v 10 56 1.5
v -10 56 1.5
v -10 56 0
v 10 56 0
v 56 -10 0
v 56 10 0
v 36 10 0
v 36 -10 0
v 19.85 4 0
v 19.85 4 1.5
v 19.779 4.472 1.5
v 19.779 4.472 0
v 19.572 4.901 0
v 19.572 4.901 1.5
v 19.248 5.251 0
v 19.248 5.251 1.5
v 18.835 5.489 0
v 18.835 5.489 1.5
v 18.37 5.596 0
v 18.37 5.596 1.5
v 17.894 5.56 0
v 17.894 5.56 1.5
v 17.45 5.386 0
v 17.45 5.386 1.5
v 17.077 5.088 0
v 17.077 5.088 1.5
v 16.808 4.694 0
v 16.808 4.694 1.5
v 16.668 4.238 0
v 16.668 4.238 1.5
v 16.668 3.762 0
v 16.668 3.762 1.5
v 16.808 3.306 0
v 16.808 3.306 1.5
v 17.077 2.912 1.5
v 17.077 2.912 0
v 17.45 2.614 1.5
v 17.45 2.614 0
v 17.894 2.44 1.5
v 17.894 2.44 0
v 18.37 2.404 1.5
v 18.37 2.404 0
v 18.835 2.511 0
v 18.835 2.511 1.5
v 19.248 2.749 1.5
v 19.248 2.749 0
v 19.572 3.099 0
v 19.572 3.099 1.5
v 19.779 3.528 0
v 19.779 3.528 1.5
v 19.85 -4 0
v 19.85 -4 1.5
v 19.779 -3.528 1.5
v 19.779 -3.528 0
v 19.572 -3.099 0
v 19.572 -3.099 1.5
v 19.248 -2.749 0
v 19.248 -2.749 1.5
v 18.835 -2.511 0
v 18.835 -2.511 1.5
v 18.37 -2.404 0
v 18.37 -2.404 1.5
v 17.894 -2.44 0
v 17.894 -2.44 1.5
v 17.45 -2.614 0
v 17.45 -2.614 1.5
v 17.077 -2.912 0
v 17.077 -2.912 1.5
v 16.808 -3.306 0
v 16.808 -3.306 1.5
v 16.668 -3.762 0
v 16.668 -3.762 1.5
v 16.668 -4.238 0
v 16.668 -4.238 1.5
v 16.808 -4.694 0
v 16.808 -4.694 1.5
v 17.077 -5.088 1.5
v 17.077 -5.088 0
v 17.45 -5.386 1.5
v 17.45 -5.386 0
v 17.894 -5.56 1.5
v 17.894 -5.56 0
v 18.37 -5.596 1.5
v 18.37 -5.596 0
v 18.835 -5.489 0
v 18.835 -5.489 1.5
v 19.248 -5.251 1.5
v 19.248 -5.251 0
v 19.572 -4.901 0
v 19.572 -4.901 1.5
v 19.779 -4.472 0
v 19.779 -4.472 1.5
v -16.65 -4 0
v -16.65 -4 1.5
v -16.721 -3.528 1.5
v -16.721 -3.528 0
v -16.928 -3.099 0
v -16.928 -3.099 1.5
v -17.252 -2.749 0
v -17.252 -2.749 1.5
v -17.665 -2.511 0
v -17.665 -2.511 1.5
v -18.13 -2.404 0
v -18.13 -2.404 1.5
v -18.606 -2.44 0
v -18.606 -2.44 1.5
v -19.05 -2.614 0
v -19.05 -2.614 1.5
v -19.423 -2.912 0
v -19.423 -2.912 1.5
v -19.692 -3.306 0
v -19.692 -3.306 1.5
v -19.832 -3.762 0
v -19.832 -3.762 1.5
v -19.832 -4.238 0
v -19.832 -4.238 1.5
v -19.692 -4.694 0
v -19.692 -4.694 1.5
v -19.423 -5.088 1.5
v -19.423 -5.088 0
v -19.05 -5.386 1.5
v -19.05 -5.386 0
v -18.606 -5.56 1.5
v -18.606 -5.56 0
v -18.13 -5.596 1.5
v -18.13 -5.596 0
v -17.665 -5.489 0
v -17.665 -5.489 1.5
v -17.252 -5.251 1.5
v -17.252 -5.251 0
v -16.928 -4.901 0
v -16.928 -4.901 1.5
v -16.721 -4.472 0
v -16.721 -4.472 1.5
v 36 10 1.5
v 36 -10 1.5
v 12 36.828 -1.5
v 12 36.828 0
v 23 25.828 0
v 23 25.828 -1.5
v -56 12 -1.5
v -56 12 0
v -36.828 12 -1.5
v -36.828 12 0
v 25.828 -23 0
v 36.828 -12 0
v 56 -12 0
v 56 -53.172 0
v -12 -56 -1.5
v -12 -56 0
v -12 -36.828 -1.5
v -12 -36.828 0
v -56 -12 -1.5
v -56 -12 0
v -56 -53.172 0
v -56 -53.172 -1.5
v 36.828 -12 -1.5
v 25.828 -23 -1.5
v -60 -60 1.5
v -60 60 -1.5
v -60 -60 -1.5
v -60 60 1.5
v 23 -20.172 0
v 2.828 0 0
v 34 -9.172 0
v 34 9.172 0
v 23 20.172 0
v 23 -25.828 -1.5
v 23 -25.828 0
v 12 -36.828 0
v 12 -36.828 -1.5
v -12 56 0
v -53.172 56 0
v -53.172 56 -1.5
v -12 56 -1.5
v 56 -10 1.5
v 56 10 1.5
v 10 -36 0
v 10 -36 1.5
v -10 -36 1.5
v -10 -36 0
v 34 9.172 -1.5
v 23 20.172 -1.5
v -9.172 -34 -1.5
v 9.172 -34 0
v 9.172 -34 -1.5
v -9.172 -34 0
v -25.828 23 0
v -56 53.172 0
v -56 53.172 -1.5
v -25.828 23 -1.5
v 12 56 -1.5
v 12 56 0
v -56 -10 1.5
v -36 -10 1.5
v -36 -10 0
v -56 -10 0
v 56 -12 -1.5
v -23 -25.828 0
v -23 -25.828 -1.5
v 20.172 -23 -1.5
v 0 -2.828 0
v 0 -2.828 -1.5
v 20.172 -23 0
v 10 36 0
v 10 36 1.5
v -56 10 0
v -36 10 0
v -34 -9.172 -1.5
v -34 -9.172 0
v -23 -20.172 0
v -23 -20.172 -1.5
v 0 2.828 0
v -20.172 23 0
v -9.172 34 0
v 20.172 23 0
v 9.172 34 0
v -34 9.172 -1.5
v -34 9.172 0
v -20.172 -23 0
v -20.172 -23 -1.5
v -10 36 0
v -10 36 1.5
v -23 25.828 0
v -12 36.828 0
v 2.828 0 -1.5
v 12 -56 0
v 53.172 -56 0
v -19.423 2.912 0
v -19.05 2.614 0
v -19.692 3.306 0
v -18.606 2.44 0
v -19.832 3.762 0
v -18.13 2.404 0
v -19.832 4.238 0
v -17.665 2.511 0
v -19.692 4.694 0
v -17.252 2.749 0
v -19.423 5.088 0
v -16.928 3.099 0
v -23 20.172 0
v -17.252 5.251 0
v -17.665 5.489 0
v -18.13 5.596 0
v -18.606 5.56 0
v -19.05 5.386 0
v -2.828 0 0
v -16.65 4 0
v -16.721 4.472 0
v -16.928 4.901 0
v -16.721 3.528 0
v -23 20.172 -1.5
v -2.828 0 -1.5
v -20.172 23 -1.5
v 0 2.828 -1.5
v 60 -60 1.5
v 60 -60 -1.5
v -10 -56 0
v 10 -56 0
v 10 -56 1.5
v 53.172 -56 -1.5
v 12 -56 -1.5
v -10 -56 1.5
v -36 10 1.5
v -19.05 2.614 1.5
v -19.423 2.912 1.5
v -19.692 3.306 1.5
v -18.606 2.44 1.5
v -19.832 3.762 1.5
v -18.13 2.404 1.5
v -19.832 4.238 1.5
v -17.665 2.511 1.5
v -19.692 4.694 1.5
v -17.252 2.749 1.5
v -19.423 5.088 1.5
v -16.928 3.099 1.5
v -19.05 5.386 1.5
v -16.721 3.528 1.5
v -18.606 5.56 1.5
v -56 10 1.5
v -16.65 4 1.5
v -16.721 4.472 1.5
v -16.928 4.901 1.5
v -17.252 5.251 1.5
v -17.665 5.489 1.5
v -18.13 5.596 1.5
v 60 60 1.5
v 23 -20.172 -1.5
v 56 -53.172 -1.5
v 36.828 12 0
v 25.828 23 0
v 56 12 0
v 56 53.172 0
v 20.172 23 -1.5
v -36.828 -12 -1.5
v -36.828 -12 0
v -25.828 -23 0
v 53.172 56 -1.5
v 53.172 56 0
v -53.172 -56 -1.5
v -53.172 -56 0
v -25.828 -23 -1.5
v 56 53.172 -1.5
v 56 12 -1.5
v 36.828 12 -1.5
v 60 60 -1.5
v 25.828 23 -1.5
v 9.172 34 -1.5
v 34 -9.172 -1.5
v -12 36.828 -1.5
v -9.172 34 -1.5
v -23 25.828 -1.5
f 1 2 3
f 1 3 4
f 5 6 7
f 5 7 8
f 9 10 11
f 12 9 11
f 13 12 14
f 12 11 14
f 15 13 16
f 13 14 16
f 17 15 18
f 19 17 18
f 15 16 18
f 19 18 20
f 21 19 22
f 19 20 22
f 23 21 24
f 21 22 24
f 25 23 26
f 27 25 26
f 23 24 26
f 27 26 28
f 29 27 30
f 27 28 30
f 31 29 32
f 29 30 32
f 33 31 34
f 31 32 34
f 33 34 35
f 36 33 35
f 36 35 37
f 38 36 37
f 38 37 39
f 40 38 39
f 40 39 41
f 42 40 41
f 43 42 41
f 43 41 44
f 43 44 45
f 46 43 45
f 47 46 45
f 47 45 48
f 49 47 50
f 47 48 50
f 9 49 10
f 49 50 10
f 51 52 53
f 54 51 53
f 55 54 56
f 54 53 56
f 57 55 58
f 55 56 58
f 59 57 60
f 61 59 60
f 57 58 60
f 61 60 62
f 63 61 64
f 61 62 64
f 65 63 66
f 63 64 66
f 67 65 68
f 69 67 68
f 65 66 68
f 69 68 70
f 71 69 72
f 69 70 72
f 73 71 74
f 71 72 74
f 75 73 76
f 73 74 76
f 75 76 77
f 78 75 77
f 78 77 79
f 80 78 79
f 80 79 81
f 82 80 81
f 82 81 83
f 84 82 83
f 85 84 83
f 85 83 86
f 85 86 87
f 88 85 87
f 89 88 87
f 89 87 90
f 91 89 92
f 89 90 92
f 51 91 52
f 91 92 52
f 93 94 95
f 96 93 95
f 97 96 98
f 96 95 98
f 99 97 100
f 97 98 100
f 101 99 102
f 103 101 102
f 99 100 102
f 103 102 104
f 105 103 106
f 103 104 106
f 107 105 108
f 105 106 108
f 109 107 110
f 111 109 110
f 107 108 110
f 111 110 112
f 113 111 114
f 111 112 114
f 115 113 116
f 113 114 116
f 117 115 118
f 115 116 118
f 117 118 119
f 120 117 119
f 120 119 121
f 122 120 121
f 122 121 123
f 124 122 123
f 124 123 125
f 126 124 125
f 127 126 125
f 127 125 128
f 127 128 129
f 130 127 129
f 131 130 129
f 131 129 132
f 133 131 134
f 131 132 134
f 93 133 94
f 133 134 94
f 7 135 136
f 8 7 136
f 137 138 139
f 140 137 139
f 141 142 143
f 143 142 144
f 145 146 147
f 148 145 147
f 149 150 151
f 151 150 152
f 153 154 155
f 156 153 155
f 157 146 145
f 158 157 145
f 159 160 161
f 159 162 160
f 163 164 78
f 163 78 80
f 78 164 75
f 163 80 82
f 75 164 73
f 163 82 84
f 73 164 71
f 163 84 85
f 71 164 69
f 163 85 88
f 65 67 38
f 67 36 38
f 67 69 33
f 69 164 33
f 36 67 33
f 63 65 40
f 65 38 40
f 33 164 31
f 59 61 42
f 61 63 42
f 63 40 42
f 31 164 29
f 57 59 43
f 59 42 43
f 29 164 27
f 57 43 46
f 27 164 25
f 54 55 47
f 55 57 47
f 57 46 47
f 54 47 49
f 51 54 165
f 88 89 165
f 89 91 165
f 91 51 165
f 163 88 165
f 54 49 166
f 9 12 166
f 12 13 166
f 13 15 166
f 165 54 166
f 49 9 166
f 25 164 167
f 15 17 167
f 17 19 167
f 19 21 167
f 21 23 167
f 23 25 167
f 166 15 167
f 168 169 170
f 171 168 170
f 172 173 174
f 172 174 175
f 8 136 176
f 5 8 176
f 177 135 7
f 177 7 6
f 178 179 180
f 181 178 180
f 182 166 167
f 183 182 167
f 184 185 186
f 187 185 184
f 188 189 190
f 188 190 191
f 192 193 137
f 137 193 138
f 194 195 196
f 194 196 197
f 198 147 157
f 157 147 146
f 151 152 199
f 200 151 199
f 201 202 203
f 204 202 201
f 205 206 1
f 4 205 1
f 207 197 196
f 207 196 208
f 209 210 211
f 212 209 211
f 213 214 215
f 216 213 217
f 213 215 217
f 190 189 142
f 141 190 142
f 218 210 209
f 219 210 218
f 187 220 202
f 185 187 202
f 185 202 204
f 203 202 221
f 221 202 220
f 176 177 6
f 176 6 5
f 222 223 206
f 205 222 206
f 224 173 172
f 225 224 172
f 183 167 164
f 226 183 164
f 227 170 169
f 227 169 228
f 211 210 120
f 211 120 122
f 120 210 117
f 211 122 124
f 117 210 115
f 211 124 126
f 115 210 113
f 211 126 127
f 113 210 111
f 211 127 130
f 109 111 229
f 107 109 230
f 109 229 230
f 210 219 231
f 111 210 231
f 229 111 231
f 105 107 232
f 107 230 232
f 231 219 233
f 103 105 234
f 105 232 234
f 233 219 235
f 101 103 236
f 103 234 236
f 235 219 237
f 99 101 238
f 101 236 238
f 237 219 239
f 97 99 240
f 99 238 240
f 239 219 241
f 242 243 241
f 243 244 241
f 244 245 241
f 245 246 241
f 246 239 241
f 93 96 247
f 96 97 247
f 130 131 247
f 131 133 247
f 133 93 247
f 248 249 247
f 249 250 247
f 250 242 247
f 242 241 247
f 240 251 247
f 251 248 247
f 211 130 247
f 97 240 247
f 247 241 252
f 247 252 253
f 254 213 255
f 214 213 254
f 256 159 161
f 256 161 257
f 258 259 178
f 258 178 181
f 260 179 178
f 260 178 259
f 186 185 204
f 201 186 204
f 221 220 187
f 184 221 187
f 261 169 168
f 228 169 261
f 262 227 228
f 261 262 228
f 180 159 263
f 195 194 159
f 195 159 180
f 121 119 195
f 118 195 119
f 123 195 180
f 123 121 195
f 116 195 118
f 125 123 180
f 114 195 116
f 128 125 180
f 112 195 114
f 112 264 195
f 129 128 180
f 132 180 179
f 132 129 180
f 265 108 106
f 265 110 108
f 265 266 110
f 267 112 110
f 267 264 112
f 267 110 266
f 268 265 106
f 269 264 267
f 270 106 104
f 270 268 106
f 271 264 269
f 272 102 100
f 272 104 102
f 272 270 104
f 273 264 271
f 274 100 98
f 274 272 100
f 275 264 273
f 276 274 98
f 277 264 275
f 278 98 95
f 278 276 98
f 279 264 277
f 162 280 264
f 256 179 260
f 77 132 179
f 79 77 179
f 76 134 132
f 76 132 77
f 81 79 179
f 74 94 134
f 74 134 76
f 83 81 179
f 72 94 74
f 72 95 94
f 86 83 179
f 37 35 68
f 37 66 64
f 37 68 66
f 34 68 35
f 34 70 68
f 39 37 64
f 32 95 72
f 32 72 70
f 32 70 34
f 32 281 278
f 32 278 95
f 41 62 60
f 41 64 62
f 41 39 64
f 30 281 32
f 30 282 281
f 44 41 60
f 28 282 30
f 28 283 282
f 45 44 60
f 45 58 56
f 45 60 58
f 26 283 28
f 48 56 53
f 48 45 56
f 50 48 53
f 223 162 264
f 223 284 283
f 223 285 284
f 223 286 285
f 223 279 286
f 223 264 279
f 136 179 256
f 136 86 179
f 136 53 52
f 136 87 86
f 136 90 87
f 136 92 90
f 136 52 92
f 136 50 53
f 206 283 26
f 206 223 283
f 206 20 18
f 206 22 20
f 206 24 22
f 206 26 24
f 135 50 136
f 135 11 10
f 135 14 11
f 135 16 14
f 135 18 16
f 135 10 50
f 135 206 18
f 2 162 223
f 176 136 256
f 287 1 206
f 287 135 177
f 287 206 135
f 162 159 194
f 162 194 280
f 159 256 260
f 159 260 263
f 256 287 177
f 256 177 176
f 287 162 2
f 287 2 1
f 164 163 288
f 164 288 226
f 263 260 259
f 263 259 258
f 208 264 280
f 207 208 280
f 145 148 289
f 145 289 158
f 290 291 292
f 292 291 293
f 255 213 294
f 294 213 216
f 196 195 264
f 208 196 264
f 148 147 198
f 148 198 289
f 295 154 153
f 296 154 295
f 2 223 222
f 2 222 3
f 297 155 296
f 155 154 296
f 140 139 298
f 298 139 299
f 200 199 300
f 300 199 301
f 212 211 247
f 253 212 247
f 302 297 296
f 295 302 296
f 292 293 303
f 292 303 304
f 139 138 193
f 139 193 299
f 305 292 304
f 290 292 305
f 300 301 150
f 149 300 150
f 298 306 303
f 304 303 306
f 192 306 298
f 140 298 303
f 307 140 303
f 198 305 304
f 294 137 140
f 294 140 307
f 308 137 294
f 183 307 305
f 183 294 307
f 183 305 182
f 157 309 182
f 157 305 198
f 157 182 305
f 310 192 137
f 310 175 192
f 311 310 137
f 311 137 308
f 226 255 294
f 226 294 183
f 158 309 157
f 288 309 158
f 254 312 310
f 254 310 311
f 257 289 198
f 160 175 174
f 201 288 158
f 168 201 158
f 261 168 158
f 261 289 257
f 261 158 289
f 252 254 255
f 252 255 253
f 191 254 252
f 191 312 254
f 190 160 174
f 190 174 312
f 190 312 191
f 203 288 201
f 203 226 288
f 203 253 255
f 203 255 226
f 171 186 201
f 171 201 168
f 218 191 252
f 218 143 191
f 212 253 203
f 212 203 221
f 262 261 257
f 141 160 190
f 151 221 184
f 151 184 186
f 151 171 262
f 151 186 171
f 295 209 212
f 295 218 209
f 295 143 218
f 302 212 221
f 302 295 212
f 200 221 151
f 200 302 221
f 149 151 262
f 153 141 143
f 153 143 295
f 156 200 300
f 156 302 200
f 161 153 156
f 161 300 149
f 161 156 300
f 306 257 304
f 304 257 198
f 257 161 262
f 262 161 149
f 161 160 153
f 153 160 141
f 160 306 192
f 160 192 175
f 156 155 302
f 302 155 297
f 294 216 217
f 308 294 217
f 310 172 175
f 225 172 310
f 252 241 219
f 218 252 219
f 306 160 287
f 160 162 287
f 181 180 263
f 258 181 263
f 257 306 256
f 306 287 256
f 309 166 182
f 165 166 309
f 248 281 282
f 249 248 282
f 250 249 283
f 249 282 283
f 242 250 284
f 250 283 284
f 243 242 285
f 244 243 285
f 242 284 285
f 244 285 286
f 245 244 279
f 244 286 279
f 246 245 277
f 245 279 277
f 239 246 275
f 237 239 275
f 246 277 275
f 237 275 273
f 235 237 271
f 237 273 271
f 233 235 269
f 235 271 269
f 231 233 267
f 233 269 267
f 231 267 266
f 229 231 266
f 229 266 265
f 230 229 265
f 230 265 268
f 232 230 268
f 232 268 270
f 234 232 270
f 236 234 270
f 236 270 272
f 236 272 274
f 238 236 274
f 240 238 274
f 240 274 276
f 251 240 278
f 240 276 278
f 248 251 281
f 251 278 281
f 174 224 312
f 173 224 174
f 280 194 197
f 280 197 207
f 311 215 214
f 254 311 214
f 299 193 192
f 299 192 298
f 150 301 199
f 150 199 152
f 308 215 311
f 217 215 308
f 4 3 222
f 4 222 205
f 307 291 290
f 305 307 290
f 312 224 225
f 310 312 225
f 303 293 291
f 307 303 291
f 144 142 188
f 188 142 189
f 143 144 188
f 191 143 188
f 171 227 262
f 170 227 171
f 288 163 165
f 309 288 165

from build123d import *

# Parameters (mm, degrees)
F0_W             = 120
F0_H             = 120
F1_DEPTH         = 1.5
F5_W             = 120
F5_H             = 120
F5_W_2           = 112
F5_H_2           = 112
F6_DEPTH         = 1.5
F4_W             = 24
F4_H             = 24
F7_DEPTH         = 1.5
F7_COPIES_COUNT  = 4
F2_W             = 20
F2_H             = 20
F8_DEPTH         = 1.5
F8_COPIES_COUNT  = 4
F10_DEPTH        = 1.5
F12_DEPTH        = 1.5
F12_COPIES_COUNT = 4
F14_DEPTH        = 1.5
F14_COPIES_COUNT = 4
F16_R            = 1.6
F17_DEPTH        = 1.5


# Not quite as in the source:
# - a pattern or mirror of a feature is missing from the dataset's text; its kind, count and spacing are read off the source's solid


with BuildPart() as f1:
    # F0 (on Top) → F1 (new body)
    with BuildSketch(Plane.XY):
        Rectangle(F0_W, F0_H)
    extrude(amount=F1_DEPTH)

    # F5 (on face) → F6 (join)
    with BuildSketch(Plane(origin=(0, 0, 0), x_dir=(1, 0, 0), z_dir=(0, 0, -1))):
        Rectangle(F5_W, F5_H)
        Rectangle(F5_W_2, F5_H_2, mode=Mode.SUBTRACT)
    extrude(amount=F6_DEPTH)

    # F4 (on face) → F7 (join)
    with BuildSketch(Plane(origin=(0, 0, 0), x_dir=(1, 0, 0), z_dir=(0, 0, -1))):
        with Locations((0, -46)):
            Rectangle(F4_W, F4_H)
    f7 = extrude(amount=F7_DEPTH)

    # F7_copies: F7 ×4 about axis
    f7_copies_axis = Axis((0, 0, 0), (0, 0, 1))
    for i in range(1, F7_COPIES_COUNT):
        add(f7.rotate(f7_copies_axis, i * 360 / F7_COPIES_COUNT))

    # F2 (on face) → F8 (cut)
    with BuildSketch(Plane.XY.offset(1.5)):
        with Locations((0, 46)):
            Rectangle(F2_W, F2_H)
    f8 = extrude(amount=-F8_DEPTH, mode=Mode.SUBTRACT)

    # F8_copies: F8 ×4 about axis
    f8_copies_axis = Axis((0, 0, 0), (0, 0, 1))
    for i in range(1, F8_COPIES_COUNT):
        add(f8.rotate(f8_copies_axis, i * 360 / F8_COPIES_COUNT), mode=Mode.SUBTRACT)

    # F9 (on face) → F10 (join)
    with BuildSketch(Plane(origin=(0, 0, 0), x_dir=(1, 0, 0), z_dir=(0, 0, -1))):
        Polygon((-56, 56), (-56, 53.1715728753), (53.1715728753, -56), (56, -56), (56, -53.1715728753), (-53.1715728753, 56), align=None)
    f10 = extrude(amount=F10_DEPTH)

    # F10_copies: F10 across plane
    add(f10.mirror(Plane(origin=(0, 0, 0), x_dir=(0, 0, -1), z_dir=(-1, 0, 0))))

    # F11 (on face) → F12 (join)
    with BuildSketch(Plane(origin=(0, 0, 0), x_dir=(1, 0, 0), z_dir=(0, 0, -1))):
        Polygon((34, 9.1715728753), (34, 12), (36.8284271247, 12), (25.8284271247, 23), (23, 20.1715728753), align=None)
    f12 = extrude(amount=F12_DEPTH)

    # F12_copies: F12 ×4 about axis
    f12_copies_axis = Axis((0, 0, 0), (0, 0, 1))
    for i in range(1, F12_COPIES_COUNT):
        add(f12.rotate(f12_copies_axis, i * 360 / F12_COPIES_COUNT))

    # F13 (on face) → F14 (join)
    with BuildSketch(Plane(origin=(0, 0, 0), x_dir=(1, 0, 0), z_dir=(0, 0, -1))):
        Polygon((12, 36.8284271247), (12, 34), (9.1715728753, 34), (20.1715728753, 23), (23, 25.8284271247), align=None)
    f14 = extrude(amount=F14_DEPTH)

    # F14_copies: F14 ×4 about axis
    f14_copies_axis = Axis((0, 0, 0), (0, 0, 1))
    for i in range(1, F14_COPIES_COUNT):
        add(f14.rotate(f14_copies_axis, i * 360 / F14_COPIES_COUNT))

    # F16 (on face) → F17 (cut)
    with BuildSketch(Plane.XY.offset(1.5)):
        with Locations((18.25, 4)):
            Circle(F16_R)
        with Locations((18.25, -4)):
            Circle(F16_R)
        with Locations((-18.25, -4)):
            Circle(F16_R)
        with Locations((-18.25, 4)):
            Circle(F16_R)
    extrude(amount=-F17_DEPTH, mode=Mode.SUBTRACT)


solid = f1.part
